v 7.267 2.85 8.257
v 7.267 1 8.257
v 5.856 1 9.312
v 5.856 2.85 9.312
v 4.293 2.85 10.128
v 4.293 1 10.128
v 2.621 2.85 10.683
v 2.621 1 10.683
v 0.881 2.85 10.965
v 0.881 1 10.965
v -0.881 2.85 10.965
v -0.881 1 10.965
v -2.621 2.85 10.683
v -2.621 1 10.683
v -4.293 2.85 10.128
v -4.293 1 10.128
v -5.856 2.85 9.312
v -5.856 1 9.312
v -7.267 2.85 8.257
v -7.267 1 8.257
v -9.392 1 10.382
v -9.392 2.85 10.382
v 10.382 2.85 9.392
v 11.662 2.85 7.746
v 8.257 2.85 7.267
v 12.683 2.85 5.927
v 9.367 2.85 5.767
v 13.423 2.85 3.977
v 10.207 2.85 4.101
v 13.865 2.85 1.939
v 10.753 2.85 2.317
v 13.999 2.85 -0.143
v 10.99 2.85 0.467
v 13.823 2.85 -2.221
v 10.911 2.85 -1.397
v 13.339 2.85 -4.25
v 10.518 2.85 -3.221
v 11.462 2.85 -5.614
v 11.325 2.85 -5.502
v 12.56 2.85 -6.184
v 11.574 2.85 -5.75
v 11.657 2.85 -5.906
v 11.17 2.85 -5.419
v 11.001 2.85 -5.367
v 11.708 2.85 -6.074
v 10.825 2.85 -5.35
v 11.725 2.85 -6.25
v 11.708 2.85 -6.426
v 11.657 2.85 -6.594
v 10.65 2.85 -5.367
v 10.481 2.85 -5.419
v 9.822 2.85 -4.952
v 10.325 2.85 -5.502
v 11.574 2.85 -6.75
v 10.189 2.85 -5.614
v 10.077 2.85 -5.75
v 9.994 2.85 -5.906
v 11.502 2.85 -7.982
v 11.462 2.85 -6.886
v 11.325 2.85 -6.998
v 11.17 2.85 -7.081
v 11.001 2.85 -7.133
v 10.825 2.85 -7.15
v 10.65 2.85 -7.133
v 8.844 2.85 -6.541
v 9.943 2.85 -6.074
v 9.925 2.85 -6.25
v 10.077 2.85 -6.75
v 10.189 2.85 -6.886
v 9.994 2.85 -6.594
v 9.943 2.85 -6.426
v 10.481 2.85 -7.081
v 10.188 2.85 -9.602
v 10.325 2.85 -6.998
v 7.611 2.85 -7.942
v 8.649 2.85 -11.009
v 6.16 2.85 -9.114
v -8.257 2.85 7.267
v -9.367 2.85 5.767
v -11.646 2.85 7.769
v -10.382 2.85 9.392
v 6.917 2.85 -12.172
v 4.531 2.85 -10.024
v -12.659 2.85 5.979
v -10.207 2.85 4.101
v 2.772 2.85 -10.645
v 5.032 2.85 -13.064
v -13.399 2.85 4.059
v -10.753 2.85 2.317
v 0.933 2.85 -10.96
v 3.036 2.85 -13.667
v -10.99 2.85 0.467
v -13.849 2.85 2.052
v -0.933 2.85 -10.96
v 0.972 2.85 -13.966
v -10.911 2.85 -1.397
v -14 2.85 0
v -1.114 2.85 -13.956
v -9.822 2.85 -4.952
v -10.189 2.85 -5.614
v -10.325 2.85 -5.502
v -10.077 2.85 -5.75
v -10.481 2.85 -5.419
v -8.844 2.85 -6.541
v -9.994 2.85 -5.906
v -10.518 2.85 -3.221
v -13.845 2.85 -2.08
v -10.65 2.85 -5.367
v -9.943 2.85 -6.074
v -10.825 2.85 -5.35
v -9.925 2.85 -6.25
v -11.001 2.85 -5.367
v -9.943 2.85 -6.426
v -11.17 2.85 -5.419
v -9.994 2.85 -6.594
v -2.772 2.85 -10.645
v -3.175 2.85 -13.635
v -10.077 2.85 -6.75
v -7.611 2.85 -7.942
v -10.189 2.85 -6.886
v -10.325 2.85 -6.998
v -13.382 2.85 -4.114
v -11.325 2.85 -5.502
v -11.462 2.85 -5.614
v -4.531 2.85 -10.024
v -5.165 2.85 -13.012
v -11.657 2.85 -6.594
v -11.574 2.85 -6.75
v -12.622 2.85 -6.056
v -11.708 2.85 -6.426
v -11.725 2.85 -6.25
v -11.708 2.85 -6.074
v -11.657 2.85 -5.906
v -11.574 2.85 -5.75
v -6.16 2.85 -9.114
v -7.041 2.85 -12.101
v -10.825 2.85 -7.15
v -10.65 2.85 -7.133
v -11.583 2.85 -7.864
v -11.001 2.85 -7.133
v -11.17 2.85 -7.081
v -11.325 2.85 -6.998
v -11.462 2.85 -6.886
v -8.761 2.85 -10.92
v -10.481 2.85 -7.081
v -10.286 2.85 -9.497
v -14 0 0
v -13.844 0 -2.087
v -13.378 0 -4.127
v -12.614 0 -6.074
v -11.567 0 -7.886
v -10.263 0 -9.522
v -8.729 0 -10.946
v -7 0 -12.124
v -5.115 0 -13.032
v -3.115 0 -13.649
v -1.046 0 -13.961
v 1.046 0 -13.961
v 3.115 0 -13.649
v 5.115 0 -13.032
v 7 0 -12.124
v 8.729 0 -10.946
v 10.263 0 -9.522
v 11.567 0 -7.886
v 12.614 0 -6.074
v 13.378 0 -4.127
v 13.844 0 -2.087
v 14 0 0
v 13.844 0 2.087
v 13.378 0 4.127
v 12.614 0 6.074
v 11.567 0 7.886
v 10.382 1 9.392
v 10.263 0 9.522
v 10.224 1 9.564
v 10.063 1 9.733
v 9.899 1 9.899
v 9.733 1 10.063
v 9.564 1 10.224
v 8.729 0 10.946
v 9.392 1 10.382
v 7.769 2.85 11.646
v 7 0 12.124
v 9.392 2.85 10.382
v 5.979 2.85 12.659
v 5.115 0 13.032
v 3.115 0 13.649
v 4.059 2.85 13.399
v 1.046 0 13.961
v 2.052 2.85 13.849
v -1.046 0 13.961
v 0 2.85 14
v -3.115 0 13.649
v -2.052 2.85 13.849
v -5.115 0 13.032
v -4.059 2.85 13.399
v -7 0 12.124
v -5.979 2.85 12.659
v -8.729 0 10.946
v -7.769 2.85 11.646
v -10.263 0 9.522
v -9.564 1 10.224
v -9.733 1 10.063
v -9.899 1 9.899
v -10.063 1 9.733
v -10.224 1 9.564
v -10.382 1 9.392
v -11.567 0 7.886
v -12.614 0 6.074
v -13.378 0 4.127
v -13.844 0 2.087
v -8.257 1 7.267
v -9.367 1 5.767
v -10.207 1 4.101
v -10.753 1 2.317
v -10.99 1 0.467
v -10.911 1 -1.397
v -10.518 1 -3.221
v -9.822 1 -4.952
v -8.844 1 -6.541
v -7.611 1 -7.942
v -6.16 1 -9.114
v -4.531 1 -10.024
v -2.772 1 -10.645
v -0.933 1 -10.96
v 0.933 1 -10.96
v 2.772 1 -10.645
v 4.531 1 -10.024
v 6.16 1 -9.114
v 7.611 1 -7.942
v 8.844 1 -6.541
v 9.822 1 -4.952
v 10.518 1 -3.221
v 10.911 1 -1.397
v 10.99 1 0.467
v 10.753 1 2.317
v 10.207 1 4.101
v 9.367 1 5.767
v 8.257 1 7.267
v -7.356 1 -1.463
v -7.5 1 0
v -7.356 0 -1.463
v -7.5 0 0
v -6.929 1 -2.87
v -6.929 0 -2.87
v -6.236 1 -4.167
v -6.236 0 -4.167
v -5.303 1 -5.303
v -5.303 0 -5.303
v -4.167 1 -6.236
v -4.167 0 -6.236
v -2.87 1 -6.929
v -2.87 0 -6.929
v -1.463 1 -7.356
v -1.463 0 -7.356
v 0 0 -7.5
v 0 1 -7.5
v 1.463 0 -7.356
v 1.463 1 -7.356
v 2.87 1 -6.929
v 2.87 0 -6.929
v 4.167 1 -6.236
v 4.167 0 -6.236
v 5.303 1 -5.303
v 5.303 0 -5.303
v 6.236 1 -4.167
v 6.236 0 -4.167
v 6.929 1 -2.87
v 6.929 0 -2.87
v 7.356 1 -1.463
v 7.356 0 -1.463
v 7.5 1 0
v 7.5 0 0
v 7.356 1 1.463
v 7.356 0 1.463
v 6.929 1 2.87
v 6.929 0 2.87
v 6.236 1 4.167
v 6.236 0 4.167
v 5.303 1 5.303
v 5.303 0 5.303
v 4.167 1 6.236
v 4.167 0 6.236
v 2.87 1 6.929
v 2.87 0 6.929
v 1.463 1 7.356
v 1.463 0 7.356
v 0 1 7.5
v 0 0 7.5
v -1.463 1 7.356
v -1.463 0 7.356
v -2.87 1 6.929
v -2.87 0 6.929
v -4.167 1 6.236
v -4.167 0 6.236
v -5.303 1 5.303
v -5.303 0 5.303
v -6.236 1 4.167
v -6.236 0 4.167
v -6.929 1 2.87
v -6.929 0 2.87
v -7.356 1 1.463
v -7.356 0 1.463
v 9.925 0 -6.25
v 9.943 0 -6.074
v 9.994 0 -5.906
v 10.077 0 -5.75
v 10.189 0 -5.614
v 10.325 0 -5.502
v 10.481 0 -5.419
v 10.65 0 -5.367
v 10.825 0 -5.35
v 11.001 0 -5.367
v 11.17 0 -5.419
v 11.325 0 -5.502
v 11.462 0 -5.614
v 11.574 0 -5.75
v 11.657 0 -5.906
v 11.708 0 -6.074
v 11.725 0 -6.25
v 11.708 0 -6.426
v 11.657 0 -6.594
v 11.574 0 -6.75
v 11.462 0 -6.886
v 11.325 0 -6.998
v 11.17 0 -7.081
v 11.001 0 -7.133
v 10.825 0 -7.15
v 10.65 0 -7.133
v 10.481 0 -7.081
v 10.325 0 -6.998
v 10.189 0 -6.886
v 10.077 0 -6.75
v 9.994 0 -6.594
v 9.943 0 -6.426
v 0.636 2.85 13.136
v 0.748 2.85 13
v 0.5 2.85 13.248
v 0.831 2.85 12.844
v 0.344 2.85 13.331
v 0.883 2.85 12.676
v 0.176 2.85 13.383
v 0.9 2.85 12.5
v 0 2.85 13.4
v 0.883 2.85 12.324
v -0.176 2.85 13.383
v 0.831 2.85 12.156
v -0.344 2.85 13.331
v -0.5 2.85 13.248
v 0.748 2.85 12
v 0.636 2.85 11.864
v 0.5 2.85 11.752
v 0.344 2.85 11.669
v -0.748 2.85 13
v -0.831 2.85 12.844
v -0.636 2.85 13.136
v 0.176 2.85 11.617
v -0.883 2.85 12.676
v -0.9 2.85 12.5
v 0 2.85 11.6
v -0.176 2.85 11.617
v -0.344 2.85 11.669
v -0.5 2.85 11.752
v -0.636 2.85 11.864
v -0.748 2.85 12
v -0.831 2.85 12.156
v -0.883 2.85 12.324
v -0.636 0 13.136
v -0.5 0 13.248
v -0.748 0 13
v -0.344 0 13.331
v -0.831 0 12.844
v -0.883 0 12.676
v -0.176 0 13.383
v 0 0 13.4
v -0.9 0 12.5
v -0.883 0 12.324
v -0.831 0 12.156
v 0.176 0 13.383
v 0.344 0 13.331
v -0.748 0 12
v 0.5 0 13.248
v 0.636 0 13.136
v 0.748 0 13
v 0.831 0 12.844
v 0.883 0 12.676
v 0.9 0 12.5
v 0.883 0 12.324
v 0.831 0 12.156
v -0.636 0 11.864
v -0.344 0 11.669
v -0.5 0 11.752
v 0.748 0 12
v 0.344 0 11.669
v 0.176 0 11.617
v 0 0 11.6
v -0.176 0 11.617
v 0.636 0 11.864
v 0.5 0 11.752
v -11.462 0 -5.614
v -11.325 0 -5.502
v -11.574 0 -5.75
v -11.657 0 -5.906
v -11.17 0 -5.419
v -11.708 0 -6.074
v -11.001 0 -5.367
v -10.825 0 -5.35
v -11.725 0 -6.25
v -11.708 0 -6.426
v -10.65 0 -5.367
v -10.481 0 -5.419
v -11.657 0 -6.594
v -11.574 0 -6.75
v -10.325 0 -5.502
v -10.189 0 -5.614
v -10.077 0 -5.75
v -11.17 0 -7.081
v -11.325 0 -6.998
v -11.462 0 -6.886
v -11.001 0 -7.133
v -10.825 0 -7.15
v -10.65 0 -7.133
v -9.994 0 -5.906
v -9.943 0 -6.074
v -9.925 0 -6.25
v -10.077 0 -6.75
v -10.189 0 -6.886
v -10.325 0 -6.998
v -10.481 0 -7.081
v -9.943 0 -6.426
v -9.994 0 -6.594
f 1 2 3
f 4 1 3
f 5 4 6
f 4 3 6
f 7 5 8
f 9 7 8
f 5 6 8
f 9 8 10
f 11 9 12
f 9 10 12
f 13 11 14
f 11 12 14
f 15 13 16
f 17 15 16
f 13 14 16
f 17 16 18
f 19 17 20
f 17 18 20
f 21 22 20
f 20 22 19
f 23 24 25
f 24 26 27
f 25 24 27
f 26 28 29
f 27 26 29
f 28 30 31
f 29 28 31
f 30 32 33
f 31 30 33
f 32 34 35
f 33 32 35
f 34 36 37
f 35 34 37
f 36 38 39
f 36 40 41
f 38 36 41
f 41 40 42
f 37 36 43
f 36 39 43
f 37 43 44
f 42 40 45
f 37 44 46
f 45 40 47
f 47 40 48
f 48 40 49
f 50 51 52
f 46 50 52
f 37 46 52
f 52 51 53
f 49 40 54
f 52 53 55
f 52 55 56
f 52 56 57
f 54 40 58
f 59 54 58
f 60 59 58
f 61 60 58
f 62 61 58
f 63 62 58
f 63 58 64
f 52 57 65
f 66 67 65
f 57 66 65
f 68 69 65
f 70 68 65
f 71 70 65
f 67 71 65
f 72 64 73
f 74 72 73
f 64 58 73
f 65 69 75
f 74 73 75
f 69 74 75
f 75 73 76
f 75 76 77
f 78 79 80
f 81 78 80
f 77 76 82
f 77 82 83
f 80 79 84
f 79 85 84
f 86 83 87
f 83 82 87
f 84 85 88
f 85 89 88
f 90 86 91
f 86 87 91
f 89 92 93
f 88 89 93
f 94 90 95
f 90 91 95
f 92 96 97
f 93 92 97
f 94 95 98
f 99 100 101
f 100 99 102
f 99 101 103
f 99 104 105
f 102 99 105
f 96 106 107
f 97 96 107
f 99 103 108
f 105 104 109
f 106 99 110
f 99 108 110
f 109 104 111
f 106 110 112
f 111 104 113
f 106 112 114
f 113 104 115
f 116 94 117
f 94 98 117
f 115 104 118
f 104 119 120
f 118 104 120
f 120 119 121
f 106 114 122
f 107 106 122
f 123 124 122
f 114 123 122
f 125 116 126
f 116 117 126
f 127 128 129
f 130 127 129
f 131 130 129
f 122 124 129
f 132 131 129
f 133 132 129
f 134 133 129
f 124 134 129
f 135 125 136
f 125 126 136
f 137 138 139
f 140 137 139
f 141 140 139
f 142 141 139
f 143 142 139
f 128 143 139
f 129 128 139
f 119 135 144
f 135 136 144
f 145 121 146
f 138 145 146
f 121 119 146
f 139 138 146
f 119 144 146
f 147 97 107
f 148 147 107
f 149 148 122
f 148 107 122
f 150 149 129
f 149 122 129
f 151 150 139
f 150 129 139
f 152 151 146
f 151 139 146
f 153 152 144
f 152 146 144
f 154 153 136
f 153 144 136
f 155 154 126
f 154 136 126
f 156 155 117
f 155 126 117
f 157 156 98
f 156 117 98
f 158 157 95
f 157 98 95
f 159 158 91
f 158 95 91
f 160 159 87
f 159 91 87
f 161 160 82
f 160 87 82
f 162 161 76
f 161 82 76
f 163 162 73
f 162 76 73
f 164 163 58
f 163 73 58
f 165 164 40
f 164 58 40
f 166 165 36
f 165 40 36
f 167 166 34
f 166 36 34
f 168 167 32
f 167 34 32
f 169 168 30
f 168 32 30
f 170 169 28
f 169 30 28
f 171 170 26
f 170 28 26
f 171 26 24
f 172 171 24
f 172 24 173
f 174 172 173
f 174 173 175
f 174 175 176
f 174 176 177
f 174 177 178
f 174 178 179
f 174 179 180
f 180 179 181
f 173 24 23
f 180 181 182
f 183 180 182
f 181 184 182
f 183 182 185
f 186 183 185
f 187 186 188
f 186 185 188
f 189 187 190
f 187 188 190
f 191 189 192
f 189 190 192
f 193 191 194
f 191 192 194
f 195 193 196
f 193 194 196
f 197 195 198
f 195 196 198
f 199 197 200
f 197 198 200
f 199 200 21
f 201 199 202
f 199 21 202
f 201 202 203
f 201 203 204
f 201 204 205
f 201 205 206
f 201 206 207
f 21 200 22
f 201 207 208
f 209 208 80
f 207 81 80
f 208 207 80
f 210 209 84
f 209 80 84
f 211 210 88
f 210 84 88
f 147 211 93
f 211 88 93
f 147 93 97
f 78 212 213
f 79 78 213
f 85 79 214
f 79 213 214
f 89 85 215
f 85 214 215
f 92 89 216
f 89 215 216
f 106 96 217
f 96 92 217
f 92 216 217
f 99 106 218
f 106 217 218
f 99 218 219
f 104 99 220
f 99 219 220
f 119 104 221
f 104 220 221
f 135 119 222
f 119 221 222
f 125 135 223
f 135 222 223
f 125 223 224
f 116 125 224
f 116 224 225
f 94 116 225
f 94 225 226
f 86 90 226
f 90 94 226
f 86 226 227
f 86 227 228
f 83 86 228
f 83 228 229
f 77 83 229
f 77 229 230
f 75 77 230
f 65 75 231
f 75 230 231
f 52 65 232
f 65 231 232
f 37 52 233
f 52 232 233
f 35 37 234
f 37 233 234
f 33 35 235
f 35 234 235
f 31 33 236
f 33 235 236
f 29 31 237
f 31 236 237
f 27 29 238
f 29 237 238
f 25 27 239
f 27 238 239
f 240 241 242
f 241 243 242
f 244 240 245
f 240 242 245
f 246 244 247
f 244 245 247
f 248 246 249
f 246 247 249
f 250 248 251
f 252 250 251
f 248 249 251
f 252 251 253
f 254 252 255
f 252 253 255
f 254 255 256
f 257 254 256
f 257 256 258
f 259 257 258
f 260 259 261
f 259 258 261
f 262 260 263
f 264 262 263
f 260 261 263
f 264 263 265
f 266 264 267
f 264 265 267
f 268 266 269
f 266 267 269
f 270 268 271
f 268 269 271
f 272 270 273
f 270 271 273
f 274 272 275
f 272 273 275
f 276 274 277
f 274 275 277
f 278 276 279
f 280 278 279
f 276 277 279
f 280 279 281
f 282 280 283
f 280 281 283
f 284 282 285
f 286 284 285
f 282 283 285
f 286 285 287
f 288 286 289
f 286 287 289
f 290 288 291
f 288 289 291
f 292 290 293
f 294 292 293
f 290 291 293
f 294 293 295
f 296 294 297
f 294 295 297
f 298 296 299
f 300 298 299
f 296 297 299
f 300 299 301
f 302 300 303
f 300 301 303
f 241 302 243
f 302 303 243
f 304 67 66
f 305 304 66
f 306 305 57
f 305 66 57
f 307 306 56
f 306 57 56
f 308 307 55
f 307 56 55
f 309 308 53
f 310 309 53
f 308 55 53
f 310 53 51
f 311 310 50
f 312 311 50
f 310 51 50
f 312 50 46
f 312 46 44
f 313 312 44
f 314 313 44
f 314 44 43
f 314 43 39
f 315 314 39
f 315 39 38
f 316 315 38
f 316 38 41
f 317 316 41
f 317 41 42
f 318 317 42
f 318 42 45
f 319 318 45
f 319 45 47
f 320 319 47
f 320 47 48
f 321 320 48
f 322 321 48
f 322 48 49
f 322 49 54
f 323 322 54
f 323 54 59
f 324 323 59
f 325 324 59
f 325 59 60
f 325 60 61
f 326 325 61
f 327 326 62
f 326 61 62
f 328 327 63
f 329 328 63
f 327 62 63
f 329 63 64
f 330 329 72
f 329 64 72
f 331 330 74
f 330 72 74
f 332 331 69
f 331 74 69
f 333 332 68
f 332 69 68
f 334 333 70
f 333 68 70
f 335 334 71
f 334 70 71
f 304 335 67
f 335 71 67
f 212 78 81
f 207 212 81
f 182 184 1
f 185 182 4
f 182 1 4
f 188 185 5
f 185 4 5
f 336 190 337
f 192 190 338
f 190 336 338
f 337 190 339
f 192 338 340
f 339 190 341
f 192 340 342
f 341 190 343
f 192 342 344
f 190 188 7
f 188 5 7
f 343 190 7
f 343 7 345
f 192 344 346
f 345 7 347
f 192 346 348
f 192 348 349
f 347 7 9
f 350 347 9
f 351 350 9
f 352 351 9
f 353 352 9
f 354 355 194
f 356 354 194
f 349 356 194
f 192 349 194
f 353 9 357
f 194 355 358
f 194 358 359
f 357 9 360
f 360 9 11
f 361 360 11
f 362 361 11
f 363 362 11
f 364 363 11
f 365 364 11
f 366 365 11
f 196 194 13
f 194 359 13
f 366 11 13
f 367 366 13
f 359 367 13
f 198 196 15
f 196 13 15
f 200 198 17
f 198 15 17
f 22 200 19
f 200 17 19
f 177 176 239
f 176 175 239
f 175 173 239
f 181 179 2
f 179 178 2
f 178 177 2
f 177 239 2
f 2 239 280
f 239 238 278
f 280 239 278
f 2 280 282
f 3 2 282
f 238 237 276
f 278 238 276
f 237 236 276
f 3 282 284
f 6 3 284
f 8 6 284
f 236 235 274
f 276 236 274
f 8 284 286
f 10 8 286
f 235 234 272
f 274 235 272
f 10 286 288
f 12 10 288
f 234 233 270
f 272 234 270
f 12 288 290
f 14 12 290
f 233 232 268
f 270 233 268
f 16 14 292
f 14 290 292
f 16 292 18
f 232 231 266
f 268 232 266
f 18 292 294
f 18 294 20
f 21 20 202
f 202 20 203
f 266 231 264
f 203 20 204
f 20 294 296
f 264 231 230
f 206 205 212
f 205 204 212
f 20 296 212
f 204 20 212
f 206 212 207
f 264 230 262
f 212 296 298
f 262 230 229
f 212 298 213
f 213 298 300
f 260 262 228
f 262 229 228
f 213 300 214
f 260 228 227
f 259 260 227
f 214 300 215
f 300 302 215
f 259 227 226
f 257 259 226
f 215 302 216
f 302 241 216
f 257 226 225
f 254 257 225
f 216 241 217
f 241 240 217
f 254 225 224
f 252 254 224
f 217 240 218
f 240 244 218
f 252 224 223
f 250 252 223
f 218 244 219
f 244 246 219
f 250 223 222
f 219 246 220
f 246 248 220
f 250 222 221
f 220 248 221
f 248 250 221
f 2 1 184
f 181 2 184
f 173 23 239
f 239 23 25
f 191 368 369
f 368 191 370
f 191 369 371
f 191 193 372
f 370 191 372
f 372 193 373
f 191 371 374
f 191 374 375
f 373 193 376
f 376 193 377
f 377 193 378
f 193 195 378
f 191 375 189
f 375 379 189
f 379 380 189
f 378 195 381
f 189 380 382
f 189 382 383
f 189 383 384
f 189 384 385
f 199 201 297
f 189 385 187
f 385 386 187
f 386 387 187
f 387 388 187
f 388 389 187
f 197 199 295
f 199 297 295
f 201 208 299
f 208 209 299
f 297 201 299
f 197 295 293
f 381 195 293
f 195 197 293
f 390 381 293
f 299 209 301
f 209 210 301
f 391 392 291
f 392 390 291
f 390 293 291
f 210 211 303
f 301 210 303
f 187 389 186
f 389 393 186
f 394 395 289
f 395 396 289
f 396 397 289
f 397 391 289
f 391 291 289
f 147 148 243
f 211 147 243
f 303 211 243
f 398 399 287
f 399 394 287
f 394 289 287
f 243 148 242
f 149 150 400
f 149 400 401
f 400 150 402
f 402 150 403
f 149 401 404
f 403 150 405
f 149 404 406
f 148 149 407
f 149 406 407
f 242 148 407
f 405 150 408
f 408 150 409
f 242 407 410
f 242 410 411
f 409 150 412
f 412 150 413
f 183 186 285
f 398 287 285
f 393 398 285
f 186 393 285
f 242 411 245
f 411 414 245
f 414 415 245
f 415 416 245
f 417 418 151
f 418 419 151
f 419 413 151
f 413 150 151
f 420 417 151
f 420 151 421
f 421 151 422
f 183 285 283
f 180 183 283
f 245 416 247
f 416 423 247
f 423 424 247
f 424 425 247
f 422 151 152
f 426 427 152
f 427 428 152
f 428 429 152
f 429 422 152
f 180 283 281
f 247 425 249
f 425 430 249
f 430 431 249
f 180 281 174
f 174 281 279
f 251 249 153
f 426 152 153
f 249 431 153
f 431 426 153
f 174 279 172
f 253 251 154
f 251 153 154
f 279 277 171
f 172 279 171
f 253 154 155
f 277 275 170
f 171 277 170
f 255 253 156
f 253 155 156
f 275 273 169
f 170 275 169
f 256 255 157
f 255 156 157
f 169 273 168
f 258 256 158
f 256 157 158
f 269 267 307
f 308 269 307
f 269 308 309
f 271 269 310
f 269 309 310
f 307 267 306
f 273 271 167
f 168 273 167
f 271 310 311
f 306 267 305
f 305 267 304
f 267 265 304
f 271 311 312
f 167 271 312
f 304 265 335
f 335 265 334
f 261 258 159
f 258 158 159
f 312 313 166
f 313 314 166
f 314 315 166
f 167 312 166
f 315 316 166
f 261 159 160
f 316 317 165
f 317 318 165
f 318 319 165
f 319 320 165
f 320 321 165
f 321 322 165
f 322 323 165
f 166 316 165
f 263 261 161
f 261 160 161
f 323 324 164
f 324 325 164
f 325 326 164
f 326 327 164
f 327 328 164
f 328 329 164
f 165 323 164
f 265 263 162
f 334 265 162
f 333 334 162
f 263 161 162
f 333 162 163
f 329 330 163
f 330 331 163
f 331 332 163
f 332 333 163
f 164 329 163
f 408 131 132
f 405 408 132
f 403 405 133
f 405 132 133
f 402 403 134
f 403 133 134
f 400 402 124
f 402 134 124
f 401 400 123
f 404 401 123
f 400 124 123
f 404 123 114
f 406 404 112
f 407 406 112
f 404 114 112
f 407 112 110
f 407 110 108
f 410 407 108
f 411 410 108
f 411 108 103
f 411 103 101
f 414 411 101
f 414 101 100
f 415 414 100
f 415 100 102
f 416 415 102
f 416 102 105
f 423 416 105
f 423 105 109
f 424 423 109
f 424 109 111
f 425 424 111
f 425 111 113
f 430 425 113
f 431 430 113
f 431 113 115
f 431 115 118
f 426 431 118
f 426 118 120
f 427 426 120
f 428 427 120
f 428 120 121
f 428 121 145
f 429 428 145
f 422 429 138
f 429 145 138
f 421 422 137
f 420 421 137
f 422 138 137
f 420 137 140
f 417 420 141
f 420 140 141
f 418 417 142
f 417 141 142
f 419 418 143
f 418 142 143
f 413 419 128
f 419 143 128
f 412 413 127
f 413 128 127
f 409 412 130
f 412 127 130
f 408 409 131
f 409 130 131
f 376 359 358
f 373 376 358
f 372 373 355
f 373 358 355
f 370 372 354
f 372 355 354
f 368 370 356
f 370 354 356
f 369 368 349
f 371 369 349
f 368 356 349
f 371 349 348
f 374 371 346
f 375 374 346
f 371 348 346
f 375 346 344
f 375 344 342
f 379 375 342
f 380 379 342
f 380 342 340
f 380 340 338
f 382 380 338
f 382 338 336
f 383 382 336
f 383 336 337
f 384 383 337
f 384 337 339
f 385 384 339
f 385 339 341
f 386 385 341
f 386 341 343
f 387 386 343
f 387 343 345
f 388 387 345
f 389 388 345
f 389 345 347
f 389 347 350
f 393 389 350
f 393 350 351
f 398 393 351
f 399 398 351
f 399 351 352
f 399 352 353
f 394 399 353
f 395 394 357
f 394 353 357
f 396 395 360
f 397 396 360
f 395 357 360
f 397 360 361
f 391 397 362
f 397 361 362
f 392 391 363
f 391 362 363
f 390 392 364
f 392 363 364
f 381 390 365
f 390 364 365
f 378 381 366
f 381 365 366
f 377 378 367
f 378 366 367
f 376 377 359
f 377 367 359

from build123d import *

# Parameters (mm, degrees)
CUT_EXTRUDE1_DEPTH = 1.85
SKETCH4_R          = 0.9
CUT_EXTRUDE2_DEPTH = 21.003062266


with BuildPart() as part:
    # Sketch1 → Revolve1 (revolve)
    with BuildSketch(Plane.XY, mode=Mode.PRIVATE) as revolve1_sk:
        Polygon((7.5, 1), (7.5, 0), (14, 0), (14, 2.85), (11, 2.85), (11, 1), align=None)
    revolve(revolve1_sk.sketch.rotate(Axis((0, 1, 0), (0, -1, 0)), 180), axis=Axis((0, 1, 0), (0, -1, 0)))

    # Sketch2 → Cut-Extrude1 (cut)
    with BuildSketch(Plane(origin=(0, 2.85, 0), x_dir=(1, 0, 0), z_dir=(0, 1, 0))):
        with BuildLine():
            ThreePointArc((-7.267434673, -8.257384167), (-7.526619427, -8.021845174), (-7.778174593, -7.778174593))
            Line((-7.778174593, -7.778174593), (-9.899494937, -9.899494937))
            ThreePointArc((-9.899494937, -9.899494937), (-9.648834126, -10.143963722), (-9.392138077, -10.382087571))
            Line((-9.392138077, -10.382087571), (-7.267434673, -8.257384167))
        make_face()
        with BuildLine():
            Line((-9.899494937, -9.899494937), (-7.778174593, -7.778174593))
            ThreePointArc((-7.778174593, -7.778174593), (-8.021845174, -7.526619427), (-8.257384167, -7.267434673))
            Line((-8.257384167, -7.267434673), (-10.382087571, -9.392138077))
            ThreePointArc((-10.382087571, -9.392138077), (-10.143963722, -9.648834126), (-9.899494937, -9.899494937))
        make_face()
        with BuildLine():
            Line((10.382087571, -9.392138077), (8.257384167, -7.267434673))
            ThreePointArc((8.257384167, -7.267434673), (7.778174593, -7.778174593), (7.267434673, -8.257384167))
            Line((7.267434673, -8.257384167), (9.392138077, -10.382087571))
            ThreePointArc((9.392138077, -10.382087571), (9.648834126, -10.143963722), (9.899494937, -9.899494937))
            ThreePointArc((9.899494937, -9.899494937), (10.143963722, -9.648834126), (10.382087571, -9.392138077))
        make_face()
    extrude(amount=-CUT_EXTRUDE1_DEPTH, mode=Mode.SUBTRACT)

    # Sketch4 → Cut-Extrude2 (cut, through all)
    with BuildSketch(Plane(origin=(0, 2.85, 0), x_dir=(1, 0, 0), z_dir=(0, 1, 0))):
        with Locations(Location((-10.825317547, 6.25, 0), (0, 0, 180))):
            Circle(SKETCH4_R)
        with Locations(Location((10.825317547, 6.25, 0), (0, 0, 180))):
            Circle(SKETCH4_R)
        with Locations(Location((0, -12.5, 0), (0, 0, 180))):
            Circle(SKETCH4_R)
    extrude(amount=-CUT_EXTRUDE2_DEPTH, mode=Mode.SUBTRACT)


solid = part.part
